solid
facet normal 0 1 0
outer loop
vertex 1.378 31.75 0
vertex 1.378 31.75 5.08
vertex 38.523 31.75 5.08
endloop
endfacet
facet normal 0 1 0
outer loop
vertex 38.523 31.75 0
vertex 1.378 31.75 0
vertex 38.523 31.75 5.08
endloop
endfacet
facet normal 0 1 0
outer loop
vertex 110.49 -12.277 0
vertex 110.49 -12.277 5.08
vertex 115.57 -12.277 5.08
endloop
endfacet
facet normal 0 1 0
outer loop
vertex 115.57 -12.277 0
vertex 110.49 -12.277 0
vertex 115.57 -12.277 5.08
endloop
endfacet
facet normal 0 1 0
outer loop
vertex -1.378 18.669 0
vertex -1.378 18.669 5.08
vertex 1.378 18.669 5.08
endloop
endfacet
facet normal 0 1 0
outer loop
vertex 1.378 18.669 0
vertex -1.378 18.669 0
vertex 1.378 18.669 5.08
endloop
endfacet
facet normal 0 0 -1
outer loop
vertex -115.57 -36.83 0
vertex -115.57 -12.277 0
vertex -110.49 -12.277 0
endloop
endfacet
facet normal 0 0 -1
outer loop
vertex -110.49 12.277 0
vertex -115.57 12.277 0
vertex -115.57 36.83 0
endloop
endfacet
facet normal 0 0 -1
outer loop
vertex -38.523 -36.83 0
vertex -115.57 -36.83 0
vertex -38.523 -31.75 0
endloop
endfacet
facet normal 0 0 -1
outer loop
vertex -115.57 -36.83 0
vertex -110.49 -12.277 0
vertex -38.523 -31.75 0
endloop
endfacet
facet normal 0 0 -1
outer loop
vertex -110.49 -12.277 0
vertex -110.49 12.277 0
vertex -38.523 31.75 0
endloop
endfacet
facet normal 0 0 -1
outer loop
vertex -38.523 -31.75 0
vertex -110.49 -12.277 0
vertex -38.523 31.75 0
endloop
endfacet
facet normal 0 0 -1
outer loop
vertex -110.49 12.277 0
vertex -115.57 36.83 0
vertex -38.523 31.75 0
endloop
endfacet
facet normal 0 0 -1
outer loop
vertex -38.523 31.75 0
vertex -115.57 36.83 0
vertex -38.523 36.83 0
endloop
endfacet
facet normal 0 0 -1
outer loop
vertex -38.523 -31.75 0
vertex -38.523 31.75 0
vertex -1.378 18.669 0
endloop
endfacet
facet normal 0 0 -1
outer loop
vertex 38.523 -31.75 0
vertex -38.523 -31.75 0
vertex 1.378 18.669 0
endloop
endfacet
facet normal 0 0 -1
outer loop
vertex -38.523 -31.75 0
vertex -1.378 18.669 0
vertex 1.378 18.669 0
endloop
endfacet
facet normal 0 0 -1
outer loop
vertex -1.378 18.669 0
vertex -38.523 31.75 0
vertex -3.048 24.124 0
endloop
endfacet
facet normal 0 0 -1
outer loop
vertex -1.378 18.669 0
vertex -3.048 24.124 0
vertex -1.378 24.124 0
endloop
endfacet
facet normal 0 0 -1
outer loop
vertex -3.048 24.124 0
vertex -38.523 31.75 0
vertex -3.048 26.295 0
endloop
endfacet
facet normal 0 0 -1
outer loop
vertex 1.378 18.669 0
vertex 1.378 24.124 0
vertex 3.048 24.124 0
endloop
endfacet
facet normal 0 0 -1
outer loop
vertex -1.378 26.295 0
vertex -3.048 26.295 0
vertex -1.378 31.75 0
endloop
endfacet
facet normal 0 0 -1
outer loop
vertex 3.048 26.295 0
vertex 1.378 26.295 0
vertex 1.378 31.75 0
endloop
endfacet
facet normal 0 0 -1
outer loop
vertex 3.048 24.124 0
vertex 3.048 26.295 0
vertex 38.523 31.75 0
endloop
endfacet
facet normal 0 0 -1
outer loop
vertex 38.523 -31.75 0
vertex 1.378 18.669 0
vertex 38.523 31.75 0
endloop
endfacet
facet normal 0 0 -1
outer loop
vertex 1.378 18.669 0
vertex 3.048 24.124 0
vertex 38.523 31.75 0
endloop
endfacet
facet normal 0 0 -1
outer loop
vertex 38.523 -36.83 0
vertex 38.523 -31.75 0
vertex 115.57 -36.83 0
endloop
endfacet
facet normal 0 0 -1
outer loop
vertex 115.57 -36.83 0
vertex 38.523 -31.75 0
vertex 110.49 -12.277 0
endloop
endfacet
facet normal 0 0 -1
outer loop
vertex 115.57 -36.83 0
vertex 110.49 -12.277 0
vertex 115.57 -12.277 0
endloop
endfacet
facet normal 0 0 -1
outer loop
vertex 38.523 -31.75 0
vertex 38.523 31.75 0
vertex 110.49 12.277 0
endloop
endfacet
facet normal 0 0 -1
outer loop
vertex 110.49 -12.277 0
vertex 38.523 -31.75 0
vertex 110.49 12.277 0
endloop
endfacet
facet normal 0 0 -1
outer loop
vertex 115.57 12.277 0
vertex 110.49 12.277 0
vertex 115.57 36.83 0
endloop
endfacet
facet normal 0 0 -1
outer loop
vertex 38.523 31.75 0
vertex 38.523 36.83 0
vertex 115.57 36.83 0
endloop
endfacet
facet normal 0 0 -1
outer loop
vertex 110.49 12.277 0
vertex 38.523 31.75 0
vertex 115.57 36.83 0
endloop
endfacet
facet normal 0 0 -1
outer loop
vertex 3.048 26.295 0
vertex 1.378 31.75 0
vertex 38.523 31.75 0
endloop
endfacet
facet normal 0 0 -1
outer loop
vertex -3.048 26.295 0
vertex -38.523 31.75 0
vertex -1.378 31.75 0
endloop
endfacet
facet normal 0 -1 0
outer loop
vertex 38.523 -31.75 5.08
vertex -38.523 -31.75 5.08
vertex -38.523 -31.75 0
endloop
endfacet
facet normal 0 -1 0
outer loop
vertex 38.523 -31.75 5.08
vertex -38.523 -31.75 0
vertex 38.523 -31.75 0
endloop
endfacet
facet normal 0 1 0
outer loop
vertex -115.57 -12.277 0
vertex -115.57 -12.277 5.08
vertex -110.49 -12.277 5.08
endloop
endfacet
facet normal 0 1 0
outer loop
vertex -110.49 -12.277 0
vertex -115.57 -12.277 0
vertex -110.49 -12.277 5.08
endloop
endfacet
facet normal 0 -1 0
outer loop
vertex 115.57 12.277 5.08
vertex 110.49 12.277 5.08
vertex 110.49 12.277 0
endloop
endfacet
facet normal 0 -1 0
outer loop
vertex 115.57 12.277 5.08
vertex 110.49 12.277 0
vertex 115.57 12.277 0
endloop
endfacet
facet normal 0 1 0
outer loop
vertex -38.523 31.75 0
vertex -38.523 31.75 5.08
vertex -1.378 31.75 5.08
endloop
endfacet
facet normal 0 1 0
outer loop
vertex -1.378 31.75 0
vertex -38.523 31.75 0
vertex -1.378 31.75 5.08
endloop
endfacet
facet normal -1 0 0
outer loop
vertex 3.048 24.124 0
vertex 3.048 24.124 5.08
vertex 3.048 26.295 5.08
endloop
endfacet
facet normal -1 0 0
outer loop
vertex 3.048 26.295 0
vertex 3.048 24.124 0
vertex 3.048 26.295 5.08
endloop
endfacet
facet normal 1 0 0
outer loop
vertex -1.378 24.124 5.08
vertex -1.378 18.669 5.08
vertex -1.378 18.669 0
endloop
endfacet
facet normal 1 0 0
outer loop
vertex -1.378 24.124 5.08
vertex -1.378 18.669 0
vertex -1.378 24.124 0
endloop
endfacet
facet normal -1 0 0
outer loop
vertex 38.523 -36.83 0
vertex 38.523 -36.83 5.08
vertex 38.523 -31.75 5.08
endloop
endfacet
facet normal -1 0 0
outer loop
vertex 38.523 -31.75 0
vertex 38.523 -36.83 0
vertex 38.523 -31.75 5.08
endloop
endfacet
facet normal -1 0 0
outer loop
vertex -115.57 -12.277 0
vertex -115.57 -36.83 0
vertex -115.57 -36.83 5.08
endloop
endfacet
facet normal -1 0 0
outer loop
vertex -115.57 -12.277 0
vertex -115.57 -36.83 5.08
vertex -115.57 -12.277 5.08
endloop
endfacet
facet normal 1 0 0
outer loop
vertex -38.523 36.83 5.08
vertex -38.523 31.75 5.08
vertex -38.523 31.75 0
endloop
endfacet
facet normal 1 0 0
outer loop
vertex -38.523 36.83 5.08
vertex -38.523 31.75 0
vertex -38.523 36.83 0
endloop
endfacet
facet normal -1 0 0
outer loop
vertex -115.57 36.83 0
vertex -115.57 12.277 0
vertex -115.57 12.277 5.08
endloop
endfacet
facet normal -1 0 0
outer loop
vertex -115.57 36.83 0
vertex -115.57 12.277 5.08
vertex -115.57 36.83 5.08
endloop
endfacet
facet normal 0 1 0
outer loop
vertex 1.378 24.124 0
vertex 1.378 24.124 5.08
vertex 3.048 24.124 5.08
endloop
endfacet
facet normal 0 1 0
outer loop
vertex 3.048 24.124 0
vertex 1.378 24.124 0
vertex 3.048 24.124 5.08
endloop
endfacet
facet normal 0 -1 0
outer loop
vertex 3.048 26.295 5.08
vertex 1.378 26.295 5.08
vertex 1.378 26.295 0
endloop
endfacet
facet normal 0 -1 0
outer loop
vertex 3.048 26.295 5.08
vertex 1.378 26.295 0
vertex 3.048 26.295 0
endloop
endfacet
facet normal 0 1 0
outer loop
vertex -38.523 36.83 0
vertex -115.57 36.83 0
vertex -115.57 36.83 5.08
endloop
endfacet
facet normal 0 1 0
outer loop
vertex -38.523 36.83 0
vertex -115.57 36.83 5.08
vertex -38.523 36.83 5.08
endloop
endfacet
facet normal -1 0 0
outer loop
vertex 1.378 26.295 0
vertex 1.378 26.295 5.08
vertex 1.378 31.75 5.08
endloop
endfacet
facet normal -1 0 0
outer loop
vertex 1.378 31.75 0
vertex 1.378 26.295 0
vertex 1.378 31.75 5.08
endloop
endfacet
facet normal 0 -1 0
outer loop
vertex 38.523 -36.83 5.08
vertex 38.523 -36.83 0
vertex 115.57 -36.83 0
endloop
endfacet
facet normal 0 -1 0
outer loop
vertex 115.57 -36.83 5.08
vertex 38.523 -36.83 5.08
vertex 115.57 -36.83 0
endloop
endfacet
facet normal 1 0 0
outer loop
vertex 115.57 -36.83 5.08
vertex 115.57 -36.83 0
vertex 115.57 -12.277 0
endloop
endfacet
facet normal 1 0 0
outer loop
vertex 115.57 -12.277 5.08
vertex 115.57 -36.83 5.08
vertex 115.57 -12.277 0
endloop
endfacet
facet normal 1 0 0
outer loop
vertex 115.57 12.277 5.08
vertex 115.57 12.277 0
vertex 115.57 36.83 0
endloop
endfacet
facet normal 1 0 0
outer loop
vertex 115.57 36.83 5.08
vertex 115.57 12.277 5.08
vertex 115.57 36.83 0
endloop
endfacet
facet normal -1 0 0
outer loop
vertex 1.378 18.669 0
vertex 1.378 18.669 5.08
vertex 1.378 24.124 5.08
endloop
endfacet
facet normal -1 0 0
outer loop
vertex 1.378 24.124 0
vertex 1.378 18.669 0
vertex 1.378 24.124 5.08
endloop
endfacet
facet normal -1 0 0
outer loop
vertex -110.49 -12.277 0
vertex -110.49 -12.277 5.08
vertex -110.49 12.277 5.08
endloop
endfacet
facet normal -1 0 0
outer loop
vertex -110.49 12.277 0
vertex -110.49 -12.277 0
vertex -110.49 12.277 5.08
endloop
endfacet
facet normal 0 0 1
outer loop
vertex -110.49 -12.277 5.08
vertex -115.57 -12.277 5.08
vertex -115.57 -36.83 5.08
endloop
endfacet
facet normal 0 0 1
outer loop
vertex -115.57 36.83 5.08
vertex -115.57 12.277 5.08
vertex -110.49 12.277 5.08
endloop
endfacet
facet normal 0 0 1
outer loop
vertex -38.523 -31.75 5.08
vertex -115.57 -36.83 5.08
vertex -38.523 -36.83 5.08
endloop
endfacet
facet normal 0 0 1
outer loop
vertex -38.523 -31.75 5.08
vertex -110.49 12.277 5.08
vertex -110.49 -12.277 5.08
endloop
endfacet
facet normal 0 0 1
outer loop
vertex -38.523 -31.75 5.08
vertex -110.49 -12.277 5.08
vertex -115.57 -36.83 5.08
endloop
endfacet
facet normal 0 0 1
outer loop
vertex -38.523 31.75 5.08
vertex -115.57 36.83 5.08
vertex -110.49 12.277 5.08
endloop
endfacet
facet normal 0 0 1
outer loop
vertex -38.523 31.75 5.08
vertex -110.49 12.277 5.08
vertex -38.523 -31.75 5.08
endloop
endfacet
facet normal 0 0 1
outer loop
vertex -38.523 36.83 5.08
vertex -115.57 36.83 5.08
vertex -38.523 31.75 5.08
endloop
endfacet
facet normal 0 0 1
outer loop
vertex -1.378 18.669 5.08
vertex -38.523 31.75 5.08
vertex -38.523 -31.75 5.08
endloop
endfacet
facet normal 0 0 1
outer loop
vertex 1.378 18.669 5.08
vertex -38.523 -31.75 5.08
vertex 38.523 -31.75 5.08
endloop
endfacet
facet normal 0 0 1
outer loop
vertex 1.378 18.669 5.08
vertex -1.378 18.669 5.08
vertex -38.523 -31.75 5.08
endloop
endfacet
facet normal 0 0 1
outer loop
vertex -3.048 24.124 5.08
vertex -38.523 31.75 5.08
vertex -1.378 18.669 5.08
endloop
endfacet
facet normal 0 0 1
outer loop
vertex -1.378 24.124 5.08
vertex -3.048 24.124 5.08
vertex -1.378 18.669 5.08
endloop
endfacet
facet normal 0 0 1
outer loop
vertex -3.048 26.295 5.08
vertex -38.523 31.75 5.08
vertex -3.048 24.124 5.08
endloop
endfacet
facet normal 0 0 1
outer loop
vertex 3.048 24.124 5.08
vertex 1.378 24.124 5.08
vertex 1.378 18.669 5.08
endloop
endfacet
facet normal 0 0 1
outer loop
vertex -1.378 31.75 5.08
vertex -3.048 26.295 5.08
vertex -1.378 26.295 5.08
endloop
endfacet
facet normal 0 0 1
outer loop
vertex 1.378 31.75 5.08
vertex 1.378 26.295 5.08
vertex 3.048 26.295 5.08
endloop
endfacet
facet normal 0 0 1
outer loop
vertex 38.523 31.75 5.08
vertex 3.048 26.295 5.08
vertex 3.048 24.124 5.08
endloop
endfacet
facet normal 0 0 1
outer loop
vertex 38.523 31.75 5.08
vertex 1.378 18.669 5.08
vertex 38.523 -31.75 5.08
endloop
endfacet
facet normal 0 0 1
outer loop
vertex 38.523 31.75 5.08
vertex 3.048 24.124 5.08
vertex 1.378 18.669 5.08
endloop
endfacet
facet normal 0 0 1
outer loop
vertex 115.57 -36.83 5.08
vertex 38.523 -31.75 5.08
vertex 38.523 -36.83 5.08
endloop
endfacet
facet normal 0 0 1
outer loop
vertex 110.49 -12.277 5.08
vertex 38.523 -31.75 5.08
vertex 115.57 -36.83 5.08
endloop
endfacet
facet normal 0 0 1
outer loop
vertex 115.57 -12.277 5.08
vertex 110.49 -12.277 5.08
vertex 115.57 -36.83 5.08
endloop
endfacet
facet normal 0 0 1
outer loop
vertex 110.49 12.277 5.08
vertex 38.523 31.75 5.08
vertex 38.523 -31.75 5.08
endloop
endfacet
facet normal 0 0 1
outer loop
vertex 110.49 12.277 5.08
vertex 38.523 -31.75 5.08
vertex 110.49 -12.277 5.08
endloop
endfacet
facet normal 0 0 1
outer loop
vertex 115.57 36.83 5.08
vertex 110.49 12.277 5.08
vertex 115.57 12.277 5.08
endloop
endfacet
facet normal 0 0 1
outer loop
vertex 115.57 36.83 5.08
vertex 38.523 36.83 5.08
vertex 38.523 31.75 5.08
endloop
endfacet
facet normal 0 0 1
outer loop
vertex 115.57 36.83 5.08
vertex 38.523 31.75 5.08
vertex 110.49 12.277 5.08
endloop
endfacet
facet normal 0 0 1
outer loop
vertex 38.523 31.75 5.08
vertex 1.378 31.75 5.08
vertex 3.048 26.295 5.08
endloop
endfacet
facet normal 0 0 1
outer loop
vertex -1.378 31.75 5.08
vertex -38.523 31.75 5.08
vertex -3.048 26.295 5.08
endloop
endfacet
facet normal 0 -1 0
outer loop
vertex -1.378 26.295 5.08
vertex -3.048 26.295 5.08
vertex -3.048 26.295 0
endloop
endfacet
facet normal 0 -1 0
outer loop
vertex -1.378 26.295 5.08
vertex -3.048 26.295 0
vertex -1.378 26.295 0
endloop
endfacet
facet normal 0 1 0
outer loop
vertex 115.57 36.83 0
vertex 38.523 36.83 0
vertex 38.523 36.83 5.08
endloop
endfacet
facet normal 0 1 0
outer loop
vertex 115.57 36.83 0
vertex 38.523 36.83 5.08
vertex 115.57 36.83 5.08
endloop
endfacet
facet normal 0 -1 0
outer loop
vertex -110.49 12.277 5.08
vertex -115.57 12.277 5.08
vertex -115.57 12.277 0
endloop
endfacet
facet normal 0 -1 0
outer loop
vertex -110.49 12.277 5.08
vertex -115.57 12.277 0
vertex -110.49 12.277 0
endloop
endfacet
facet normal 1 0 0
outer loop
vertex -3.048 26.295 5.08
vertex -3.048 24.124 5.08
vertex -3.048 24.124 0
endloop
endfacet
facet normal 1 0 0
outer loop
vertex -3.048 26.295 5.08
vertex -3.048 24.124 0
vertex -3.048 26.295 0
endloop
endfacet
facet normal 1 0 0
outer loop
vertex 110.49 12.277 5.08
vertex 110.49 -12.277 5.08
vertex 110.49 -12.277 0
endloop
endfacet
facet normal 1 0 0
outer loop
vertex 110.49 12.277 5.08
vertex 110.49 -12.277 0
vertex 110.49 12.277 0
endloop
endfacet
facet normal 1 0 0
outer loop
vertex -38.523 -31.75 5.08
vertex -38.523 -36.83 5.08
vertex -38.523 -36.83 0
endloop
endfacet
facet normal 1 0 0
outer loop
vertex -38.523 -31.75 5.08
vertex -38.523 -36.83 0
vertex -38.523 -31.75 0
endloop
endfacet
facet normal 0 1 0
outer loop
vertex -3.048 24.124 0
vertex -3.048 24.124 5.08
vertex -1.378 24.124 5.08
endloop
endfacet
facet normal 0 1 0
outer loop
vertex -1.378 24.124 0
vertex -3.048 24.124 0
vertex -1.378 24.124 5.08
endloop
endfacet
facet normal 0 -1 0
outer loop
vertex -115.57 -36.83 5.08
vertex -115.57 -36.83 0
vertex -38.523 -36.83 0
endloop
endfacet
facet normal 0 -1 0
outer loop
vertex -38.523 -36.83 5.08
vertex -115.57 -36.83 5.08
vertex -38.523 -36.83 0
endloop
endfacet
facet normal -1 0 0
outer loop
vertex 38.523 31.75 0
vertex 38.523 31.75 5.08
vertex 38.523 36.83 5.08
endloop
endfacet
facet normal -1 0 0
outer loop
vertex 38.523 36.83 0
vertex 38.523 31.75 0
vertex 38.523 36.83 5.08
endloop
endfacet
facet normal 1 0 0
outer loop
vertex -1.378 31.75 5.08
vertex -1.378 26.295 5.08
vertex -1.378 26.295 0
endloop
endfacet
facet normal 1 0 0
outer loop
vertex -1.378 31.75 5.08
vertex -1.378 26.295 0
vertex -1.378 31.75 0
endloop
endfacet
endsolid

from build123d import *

# Parameters (mm, degrees)
SKETCH1_W           = 231.14
SKETCH1_H           = 73.66
BOSS_EXTRUDE1_DEPTH = 5.08
SKETCH2_W           = 77.046666666
SKETCH2_H           = 5.08
CUT_EXTRUDE1_DEPTH  = 6.08
SKETCH3_W           = 5.08
SKETCH3_H           = 24.553333334
CUT_EXTRUDE2_DEPTH  = 6.08
SKETCH5_W           = 2.7559
SKETCH5_H           = 13.081
CUT_EXTRUDE4_DEPTH  = 6.08
SKETCH6_W           = 6.096
SKETCH6_H           = 2.1717
CUT_EXTRUDE5_DEPTH  = 6.08


with BuildPart() as part:
    # Sketch1 → Boss-Extrude1 (new body)
    with BuildSketch(Plane.XY):
        Rectangle(SKETCH1_W, SKETCH1_H)
    extrude(amount=BOSS_EXTRUDE1_DEPTH)

    # Sketch2 → Cut-Extrude1 (cut, through all)
    with BuildSketch(Plane.XY.offset(5.08)):
        with Locations((0, -34.29)):
            Rectangle(SKETCH2_W, SKETCH2_H)
        with Locations((0, 34.29)):
            Rectangle(SKETCH2_W, SKETCH2_H)
    extrude(amount=-CUT_EXTRUDE1_DEPTH, mode=Mode.SUBTRACT)

    # Sketch3 → Cut-Extrude2 (cut, through all)
    with BuildSketch(Plane.XY.offset(5.08)):
        with Locations((-113.03, 0)):
            Rectangle(SKETCH3_W, SKETCH3_H)
        with Locations((113.03, 0)):
            Rectangle(SKETCH3_W, SKETCH3_H)
    extrude(amount=-CUT_EXTRUDE2_DEPTH, mode=Mode.SUBTRACT)

    # Sketch5 → Cut-Extrude4 (cut, through all)
    with BuildSketch(Plane.XY.offset(5.08)):
        with Locations((0, 25.2095)):
            Rectangle(SKETCH5_W, SKETCH5_H)
    extrude(amount=-CUT_EXTRUDE4_DEPTH, mode=Mode.SUBTRACT)

    # Sketch6 → Cut-Extrude5 (cut, through all)
    with BuildSketch(Plane.XY.offset(5.08)):
        with Locations((0, 25.2095)):
            Rectangle(SKETCH6_W, SKETCH6_H)
    extrude(amount=-CUT_EXTRUDE5_DEPTH, mode=Mode.SUBTRACT)


solid = part.part
